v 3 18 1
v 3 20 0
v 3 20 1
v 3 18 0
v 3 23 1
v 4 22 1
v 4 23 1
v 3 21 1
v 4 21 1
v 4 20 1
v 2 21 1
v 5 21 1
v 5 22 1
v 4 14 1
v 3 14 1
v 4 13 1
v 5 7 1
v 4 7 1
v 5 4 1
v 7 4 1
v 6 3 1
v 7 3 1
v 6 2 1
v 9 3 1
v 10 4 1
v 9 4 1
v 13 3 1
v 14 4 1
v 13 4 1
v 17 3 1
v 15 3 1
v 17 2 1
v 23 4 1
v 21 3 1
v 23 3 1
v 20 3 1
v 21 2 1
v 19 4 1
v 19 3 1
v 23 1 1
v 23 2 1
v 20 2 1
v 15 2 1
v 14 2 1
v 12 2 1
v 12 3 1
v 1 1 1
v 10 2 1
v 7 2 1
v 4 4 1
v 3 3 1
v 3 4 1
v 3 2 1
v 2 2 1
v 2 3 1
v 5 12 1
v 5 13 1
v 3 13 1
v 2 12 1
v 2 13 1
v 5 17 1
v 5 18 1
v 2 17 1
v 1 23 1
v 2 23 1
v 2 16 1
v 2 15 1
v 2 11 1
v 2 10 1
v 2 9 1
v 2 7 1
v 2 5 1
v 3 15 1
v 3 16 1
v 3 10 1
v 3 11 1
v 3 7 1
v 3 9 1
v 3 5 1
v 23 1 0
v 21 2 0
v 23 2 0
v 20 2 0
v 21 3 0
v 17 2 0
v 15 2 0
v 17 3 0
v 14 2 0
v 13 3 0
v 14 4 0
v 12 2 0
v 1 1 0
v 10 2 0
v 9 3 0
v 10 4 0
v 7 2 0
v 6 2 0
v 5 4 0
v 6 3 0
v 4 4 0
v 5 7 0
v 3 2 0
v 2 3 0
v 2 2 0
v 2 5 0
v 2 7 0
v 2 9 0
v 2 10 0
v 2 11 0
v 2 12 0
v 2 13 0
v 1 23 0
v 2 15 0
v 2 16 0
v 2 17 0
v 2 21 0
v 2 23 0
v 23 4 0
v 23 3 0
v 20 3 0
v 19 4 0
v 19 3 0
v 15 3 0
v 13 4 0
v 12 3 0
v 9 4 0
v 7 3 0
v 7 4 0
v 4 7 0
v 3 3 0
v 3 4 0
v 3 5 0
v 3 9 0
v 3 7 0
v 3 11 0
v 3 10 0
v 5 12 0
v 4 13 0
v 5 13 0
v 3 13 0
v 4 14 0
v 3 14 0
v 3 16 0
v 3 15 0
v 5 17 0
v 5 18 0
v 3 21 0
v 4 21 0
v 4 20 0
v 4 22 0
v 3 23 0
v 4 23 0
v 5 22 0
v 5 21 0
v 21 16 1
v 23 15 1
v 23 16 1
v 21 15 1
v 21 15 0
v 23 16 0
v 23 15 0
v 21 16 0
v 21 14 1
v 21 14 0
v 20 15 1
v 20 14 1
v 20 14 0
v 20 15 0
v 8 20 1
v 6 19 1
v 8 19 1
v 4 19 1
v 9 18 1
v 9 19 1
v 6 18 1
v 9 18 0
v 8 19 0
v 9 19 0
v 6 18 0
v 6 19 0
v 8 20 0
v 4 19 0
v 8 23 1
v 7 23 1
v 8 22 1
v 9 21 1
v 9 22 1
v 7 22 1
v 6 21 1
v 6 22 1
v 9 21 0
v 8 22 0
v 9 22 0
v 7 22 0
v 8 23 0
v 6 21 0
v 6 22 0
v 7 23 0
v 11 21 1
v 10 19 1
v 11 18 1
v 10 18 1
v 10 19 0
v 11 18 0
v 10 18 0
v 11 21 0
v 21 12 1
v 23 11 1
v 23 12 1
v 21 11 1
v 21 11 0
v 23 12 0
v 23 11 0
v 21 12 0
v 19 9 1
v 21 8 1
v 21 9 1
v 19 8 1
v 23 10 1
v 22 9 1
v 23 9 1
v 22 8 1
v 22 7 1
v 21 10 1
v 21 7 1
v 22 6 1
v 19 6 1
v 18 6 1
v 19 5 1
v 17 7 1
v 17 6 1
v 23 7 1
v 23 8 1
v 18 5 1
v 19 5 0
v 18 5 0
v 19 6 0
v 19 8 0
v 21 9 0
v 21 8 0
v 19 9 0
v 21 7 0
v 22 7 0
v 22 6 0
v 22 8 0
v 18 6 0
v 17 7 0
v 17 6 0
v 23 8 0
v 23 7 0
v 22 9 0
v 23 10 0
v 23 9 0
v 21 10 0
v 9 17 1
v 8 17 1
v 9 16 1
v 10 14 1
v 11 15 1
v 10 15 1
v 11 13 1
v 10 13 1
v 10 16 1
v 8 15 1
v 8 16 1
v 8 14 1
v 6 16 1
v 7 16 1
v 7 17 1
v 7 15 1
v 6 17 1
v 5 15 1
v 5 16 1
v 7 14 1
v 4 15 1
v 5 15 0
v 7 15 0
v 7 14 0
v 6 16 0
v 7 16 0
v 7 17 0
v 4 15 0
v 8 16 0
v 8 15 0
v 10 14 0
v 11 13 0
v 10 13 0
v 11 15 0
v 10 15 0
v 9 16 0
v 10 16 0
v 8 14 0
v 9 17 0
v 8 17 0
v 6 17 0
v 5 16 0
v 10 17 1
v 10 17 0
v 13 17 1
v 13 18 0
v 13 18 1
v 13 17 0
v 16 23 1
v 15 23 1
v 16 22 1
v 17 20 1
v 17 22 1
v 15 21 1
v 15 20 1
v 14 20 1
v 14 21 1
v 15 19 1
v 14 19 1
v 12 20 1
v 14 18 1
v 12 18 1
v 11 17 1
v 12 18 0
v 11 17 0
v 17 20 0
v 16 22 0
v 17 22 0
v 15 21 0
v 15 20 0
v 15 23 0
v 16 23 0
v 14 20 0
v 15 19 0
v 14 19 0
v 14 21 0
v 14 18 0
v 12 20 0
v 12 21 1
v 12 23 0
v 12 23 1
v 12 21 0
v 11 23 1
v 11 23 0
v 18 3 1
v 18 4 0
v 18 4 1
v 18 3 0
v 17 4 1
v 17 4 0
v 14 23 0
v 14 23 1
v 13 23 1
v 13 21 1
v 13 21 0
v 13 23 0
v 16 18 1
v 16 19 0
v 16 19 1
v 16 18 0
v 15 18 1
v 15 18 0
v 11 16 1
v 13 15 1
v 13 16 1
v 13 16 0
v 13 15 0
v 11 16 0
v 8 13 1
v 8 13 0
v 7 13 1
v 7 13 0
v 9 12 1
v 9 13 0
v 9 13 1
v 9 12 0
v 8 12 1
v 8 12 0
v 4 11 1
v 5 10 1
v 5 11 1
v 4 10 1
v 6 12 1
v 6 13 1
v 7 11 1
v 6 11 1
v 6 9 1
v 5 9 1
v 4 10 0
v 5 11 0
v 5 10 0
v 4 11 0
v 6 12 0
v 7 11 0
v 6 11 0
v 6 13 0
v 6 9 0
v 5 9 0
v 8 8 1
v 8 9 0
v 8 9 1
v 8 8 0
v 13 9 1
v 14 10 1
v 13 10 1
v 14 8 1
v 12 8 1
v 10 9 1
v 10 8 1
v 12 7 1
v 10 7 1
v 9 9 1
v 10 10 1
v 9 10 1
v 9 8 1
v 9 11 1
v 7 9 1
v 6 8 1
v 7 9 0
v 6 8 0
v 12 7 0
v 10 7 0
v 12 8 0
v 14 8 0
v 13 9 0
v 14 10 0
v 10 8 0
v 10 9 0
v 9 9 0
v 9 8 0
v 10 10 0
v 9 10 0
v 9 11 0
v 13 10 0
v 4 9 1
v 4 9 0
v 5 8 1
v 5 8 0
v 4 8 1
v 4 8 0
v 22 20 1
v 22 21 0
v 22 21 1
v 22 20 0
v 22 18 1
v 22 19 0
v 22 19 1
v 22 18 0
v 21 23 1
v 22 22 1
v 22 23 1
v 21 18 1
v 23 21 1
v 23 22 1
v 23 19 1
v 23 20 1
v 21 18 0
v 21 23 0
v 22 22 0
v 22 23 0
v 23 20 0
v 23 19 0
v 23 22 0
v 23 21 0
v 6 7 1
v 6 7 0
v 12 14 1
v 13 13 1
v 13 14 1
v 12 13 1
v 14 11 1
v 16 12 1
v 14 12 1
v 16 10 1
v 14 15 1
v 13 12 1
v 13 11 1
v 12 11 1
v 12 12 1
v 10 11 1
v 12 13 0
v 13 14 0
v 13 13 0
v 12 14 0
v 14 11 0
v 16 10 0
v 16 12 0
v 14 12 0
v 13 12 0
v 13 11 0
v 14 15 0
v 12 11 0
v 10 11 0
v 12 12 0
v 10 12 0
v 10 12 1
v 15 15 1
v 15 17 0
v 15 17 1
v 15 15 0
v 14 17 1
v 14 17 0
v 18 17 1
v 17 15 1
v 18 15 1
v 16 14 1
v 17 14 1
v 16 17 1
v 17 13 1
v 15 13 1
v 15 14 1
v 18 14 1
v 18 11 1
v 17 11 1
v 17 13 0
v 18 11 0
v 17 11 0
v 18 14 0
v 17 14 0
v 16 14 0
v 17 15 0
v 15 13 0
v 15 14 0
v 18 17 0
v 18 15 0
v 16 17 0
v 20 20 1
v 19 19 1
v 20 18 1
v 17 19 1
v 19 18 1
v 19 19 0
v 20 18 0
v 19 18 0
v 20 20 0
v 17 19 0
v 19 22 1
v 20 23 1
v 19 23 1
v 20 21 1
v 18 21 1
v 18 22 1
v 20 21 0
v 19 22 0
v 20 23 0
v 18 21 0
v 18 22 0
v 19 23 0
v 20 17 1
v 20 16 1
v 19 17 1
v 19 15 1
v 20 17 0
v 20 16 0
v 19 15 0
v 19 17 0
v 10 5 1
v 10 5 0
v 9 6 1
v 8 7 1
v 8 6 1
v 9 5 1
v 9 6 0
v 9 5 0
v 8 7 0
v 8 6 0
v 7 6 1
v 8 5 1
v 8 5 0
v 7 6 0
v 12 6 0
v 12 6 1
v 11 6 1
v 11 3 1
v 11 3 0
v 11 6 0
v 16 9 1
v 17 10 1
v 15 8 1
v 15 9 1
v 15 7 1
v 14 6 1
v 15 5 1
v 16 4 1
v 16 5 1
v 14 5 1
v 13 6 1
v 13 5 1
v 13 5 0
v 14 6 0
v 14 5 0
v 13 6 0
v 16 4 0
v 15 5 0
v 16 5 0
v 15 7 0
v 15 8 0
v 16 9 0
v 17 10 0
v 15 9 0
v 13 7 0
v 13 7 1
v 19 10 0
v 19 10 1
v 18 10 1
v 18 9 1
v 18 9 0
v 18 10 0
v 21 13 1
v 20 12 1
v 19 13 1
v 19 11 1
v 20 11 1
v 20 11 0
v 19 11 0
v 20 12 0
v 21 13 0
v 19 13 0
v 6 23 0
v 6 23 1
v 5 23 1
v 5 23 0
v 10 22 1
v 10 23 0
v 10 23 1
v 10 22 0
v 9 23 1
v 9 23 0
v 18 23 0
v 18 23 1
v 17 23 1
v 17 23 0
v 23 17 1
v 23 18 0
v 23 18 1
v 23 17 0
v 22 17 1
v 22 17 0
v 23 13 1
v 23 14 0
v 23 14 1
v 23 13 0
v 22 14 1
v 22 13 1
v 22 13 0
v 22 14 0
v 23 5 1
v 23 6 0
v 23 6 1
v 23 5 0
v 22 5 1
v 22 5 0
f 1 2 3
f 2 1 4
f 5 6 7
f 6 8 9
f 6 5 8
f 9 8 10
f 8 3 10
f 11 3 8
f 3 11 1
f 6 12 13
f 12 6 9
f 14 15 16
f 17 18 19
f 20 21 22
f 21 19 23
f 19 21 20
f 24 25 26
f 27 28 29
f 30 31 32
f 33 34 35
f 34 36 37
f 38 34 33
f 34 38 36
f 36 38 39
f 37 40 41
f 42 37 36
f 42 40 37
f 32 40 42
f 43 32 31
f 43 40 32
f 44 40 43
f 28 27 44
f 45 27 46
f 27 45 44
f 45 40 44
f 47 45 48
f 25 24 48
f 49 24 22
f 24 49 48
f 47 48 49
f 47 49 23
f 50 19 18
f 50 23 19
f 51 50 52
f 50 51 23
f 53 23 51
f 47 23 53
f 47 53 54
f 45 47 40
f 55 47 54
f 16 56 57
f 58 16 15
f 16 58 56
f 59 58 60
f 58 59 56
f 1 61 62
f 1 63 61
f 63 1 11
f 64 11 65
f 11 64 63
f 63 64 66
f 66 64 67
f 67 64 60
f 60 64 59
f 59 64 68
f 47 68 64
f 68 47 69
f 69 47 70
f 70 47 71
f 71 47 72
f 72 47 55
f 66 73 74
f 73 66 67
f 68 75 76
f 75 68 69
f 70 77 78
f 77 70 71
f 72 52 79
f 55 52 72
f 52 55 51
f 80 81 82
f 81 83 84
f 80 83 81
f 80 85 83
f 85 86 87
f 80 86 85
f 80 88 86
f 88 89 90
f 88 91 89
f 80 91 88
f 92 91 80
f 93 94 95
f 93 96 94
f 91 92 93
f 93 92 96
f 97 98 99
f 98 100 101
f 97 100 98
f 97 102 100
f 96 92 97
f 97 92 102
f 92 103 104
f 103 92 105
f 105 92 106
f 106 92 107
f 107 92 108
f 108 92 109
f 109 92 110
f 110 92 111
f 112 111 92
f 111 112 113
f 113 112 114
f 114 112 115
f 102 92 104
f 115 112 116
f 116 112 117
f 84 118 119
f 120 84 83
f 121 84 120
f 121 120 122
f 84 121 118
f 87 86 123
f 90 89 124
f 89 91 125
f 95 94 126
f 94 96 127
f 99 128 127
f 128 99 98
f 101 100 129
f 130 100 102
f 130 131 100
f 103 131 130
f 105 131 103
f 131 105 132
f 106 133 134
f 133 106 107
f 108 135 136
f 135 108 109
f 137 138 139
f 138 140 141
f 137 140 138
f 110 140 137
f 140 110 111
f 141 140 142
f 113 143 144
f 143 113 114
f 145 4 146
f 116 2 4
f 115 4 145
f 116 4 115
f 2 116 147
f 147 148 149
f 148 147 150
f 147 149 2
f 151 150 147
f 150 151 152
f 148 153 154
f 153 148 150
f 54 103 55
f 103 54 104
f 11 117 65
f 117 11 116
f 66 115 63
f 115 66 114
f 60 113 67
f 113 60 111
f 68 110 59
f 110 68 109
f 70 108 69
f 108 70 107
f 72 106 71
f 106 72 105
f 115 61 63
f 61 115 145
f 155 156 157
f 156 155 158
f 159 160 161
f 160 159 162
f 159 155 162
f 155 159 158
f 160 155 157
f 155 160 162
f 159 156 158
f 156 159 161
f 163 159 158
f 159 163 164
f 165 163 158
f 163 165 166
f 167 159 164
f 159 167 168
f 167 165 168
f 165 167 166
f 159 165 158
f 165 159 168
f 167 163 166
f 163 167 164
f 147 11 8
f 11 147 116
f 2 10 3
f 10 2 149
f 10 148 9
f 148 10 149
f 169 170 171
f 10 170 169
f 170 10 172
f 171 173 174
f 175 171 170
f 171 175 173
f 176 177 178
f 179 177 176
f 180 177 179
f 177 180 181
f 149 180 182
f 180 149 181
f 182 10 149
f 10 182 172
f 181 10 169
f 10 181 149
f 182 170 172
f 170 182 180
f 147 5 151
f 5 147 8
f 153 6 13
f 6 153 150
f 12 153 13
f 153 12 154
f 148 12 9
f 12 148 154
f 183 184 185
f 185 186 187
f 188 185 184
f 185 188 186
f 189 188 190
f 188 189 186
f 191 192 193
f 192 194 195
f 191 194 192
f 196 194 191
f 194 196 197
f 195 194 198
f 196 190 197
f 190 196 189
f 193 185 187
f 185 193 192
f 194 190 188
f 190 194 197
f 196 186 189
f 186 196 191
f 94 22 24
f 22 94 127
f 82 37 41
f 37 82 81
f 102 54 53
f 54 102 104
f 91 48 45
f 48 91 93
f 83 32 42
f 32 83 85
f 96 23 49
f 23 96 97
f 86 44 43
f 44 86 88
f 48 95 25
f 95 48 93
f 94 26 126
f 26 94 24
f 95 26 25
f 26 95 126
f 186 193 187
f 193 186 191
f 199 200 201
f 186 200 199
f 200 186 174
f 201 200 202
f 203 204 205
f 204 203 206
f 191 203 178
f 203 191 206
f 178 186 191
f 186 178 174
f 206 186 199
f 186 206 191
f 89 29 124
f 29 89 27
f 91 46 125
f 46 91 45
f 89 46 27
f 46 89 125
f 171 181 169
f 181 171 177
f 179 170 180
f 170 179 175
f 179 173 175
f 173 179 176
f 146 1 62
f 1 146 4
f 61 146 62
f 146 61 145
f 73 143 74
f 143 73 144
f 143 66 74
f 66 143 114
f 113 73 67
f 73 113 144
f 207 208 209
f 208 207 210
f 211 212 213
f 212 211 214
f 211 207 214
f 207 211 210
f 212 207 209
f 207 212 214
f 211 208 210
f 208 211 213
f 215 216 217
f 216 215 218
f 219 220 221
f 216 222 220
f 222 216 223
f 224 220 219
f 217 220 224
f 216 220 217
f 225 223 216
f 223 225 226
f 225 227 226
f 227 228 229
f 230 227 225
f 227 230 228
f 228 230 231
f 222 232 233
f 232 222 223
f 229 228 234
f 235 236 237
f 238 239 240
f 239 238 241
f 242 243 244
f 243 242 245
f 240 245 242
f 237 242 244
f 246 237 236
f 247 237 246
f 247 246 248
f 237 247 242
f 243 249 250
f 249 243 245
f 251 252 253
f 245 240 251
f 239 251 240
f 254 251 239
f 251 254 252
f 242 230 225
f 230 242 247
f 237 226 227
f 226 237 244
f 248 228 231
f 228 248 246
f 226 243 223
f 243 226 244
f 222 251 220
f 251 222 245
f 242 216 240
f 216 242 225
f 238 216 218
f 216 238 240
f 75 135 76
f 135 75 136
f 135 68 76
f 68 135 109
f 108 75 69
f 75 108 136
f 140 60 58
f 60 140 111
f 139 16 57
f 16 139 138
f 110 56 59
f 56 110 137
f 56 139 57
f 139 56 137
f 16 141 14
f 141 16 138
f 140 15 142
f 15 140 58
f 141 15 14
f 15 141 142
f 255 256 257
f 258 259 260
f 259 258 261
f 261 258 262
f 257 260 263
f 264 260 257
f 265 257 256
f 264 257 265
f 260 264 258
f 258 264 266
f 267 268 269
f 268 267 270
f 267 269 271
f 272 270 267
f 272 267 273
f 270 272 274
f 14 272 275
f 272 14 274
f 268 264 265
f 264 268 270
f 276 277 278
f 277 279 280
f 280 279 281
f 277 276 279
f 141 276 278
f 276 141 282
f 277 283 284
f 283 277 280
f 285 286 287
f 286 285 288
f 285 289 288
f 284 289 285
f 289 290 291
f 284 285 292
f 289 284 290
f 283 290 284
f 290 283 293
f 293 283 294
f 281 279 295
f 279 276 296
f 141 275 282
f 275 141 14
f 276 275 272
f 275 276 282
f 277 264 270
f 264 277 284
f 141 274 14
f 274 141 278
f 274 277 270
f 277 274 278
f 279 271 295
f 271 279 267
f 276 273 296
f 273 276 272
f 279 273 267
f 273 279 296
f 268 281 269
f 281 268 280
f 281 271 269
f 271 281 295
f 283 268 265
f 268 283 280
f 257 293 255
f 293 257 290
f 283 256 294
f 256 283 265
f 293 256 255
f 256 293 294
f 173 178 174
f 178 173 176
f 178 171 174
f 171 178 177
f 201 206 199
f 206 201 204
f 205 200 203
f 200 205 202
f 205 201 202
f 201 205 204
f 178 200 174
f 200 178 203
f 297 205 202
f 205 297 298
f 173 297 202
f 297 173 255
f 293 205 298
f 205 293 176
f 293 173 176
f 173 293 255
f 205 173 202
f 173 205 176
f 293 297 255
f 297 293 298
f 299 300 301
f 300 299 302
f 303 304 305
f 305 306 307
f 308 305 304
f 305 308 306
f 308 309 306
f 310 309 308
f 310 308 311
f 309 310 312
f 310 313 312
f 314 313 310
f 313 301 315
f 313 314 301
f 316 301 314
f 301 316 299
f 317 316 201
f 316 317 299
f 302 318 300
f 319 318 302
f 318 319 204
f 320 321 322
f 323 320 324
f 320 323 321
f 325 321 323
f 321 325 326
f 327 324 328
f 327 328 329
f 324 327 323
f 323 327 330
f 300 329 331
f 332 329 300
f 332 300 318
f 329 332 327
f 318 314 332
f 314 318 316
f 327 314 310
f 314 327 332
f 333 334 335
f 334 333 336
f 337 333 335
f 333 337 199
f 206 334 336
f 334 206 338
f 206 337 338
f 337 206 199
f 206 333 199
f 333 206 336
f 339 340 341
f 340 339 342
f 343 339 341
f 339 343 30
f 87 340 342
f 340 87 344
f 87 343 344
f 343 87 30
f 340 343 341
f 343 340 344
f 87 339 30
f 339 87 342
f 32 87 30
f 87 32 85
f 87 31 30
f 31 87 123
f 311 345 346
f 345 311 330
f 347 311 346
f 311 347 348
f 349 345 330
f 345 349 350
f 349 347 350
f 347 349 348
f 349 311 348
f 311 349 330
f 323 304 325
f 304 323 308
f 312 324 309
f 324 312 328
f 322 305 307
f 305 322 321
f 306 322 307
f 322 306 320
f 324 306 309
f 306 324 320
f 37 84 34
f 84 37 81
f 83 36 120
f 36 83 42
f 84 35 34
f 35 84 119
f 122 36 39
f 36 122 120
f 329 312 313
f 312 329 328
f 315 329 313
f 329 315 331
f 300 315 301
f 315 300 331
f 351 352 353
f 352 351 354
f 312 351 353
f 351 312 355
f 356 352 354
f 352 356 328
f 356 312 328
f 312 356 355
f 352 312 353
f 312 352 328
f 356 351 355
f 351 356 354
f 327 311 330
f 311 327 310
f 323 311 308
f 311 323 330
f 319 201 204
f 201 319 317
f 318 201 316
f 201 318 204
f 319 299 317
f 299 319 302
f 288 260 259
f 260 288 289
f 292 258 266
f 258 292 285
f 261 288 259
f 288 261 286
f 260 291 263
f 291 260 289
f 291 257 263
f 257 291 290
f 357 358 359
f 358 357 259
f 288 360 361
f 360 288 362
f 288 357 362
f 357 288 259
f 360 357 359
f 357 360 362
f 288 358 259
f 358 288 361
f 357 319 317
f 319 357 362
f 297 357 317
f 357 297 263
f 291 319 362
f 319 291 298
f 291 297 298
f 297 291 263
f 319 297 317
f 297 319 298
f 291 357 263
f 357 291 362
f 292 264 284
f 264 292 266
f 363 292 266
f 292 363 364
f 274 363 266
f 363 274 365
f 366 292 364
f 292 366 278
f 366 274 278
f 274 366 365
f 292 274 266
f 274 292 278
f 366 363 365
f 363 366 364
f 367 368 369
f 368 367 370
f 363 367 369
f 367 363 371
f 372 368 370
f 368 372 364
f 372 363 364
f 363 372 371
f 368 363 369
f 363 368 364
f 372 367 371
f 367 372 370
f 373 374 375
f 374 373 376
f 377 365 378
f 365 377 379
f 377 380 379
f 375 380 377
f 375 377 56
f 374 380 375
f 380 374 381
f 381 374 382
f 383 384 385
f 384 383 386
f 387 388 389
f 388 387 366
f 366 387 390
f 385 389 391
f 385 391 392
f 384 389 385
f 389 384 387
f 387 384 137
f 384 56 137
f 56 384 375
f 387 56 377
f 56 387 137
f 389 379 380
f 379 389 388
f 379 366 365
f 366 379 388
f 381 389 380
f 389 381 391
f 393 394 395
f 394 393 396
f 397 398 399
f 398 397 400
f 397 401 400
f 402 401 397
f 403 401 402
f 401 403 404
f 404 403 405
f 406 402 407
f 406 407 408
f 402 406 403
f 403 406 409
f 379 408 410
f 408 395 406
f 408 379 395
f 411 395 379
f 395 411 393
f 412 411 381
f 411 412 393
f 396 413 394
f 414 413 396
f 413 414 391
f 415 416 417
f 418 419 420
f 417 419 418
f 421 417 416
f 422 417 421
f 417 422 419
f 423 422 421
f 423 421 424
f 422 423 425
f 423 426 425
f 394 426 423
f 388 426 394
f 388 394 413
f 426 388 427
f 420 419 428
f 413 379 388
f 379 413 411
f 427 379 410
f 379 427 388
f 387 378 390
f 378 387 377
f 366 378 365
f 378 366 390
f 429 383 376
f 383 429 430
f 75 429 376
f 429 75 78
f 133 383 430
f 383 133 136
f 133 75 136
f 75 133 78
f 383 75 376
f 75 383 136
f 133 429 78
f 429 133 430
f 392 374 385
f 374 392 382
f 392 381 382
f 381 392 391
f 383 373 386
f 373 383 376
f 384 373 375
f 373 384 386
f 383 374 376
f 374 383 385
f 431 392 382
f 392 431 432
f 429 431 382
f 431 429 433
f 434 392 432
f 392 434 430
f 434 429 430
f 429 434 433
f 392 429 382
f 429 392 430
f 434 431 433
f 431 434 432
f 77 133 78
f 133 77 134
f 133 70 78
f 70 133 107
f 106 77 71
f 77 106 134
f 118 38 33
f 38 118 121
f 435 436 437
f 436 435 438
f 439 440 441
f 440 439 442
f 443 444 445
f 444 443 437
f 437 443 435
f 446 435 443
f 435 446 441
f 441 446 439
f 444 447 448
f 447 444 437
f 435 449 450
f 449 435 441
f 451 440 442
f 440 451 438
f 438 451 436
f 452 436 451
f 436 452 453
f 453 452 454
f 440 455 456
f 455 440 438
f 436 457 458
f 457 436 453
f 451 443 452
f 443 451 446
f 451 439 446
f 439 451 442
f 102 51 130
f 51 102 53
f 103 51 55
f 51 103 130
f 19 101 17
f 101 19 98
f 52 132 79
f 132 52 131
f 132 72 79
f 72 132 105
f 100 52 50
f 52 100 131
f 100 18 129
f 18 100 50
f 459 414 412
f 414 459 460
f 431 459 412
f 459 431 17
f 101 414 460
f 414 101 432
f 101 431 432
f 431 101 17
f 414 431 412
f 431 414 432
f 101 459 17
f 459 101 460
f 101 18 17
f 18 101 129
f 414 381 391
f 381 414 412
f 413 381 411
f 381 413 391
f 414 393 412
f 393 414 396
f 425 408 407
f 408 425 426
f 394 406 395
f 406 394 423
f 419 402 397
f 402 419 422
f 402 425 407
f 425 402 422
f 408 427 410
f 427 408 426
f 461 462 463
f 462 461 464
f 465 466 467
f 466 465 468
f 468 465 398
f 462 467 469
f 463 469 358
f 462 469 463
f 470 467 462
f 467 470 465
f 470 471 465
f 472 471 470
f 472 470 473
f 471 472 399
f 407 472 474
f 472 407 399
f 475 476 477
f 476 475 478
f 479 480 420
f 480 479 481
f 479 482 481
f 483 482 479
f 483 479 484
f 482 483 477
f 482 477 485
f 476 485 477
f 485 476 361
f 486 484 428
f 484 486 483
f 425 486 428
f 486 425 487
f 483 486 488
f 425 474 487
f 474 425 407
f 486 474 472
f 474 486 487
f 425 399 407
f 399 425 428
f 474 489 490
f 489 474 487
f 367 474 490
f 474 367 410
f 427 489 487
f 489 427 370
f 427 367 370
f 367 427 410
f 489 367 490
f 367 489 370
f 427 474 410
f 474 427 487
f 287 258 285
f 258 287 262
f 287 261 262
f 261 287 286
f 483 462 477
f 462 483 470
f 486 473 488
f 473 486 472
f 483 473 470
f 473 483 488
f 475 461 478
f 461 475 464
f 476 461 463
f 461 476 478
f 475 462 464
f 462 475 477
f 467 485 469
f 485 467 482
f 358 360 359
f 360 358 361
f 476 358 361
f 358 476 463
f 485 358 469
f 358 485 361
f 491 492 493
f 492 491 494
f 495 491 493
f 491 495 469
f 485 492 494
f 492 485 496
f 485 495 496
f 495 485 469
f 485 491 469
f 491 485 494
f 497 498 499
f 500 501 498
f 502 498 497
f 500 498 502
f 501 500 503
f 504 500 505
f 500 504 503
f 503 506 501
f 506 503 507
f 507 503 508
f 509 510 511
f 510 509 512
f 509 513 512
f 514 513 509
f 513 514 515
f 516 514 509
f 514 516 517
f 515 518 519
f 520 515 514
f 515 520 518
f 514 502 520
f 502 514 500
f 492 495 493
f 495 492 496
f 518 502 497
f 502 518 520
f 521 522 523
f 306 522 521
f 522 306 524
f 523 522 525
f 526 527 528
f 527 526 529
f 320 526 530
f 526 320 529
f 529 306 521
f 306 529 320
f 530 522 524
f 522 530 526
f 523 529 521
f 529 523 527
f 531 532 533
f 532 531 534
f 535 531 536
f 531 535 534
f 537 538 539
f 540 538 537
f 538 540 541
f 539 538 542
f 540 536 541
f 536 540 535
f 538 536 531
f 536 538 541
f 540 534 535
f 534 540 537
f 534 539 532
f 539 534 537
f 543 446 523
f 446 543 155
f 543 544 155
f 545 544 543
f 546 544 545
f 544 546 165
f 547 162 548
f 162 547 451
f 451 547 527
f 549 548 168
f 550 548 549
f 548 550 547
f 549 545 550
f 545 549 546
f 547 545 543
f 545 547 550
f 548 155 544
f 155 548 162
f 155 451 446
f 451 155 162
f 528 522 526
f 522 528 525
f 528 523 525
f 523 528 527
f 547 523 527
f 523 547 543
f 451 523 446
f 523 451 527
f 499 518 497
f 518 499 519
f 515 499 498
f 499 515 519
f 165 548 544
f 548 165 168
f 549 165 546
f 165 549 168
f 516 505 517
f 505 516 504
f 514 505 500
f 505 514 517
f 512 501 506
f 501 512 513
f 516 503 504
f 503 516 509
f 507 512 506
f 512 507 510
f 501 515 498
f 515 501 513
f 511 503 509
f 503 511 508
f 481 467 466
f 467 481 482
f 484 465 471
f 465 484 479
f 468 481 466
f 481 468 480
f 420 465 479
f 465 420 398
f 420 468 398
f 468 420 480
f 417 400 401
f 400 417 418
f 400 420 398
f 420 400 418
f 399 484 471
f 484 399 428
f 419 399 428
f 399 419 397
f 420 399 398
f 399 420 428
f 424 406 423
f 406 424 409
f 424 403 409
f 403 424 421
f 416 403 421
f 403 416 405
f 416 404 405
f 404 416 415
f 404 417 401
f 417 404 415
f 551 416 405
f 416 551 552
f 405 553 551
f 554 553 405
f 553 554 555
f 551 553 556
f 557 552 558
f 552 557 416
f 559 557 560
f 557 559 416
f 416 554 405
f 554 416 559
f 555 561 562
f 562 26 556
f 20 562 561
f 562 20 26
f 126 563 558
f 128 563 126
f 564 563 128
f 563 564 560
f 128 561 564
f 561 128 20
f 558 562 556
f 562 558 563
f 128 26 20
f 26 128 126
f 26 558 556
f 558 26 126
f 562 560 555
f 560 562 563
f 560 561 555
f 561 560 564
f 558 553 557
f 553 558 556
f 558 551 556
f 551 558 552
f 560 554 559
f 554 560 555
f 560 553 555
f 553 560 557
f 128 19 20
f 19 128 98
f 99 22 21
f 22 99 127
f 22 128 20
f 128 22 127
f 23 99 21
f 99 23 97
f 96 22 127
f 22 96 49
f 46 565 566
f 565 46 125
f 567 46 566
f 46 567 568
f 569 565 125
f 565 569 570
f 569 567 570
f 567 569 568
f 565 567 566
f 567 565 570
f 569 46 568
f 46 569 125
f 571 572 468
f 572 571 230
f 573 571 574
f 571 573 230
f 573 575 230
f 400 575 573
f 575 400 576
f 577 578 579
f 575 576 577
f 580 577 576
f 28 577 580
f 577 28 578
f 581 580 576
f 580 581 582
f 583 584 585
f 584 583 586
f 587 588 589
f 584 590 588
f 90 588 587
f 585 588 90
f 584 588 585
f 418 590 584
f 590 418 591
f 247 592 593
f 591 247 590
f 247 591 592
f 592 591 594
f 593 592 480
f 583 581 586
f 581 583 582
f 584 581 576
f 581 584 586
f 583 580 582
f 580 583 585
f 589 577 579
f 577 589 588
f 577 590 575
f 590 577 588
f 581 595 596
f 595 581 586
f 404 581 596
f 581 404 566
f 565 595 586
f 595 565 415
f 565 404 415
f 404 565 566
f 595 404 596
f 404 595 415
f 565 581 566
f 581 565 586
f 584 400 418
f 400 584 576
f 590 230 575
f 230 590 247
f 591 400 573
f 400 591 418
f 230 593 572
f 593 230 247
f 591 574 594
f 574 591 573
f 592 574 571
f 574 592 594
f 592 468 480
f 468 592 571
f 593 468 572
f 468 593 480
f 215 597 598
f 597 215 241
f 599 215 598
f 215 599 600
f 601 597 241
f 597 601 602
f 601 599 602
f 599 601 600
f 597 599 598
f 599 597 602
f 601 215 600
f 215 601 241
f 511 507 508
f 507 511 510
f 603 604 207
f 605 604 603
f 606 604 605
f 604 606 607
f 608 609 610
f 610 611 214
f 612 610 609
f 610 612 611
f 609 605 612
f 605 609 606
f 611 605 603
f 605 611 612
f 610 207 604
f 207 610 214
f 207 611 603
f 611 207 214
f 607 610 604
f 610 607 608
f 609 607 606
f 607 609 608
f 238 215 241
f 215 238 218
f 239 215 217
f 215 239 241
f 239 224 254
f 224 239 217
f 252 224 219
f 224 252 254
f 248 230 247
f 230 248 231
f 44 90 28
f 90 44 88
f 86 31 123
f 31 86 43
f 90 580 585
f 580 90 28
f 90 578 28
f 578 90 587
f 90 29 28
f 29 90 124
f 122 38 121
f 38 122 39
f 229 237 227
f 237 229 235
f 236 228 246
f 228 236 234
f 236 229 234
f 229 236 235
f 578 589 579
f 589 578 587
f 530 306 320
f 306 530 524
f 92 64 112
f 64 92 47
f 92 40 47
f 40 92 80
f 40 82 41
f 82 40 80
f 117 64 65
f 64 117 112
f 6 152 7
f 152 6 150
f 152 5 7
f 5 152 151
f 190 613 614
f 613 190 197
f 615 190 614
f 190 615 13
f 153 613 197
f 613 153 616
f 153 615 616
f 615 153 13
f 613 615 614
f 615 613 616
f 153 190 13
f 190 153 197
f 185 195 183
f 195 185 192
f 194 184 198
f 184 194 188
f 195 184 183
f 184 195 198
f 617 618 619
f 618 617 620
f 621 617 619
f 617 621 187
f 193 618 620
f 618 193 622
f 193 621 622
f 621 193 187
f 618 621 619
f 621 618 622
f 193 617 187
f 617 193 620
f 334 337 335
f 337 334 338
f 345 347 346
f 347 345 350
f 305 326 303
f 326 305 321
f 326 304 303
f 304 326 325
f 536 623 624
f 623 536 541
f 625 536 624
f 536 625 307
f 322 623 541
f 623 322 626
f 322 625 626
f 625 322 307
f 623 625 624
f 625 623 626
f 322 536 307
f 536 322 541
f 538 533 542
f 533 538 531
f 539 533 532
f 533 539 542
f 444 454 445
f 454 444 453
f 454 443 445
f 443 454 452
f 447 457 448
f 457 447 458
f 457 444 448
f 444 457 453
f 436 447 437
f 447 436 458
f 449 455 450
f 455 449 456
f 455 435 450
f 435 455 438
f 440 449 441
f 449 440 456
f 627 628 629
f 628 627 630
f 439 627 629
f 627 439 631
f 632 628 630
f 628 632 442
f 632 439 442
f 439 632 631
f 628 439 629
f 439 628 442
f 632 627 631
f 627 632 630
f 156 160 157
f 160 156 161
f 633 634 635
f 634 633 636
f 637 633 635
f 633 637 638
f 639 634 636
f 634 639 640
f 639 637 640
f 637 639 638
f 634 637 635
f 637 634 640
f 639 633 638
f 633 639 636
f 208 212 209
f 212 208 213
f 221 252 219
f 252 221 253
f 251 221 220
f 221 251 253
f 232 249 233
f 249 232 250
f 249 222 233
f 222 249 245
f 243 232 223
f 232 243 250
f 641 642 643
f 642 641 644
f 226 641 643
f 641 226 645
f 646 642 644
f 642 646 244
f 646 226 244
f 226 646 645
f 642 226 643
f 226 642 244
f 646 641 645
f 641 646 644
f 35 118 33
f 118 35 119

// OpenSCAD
// file: ../../util/bitmap.scad
/*****************************************************************************
 * Module Bitmap Library
 * Modules to create bitmaps of unit squares from 1 or 2 dimensional vectors.
 *****************************************************************************
 * Copyright 2017 Chris Baker
 *
 * This program is free software: you can redistribute it and/or modify
 * it under the terms of the GNU Lesser General Public License as published by
 * the Free Software Foundation, either version 3 of the License, or
 * (at your option) any later version.
 *
 * This program is distributed in the hope that it will be useful,
 * but WITHOUT ANY WARRANTY; without even the implied warranty of
 * MERCHANTABILITY or FITNESS FOR A PARTICULAR PURPOSE.  See the
 * GNU Lesser General Public License for more details.
 *
 * You should have received a copy of the GNU Lesser General Public License
 * along with this program.  If not, see <http://www.gnu.org/licenses/>.
 *****************************************************************************
 * Usage:
 * Include this file with the "use" tag.
 * Depends on compat.scad library.
 *
 * API:
 *   1dbitmap(bitmap, center, expansion, vector_mode)
 *   2dbitmap(bitmap, center, expansion, vector_mode)
 *     Generate a 1 or 2-Dimensional field of modules based on the provided
 *     bitmap vector. See Bitmap Vectors below.
 *     The center flag determines whether to center the bitmap on the origin.
 *     The expansion value actually shrinks each cube in the x and y
 *     dimension by the specified amount.
 *     The vector_mode flag determines whether to create 3D solid geometry
 *     (unit cubes) or 2D vector geometry (squares).
 *
 * Bitmap Vectors:
 *   The bitmap vectors primarily provide boolean information.
 *   A module will be placed where these vectors have a postive value and
 *   skipped where they have a negative value. I.E. 0, -1, false, and undef
 *   are all equivalent and result in a skip. 1 and true are equivalent and
 *   result in a placed 1-unit module.
 *   Further, if the value is an integer it will be treated as a height for
 *   the module, allowing z-maps to be created.
 *   If the value is not an integer or boolean, it will be treated as a color
 *   reference. This can be a string or RGBA vector that will be used to
 *   color the module in the OpenSCAD preview window.
 *   In current versions of OpenSCAD, the color has no effect in the rendered
 *   view or STL output.
 *
 * Vector Mode:
 *   Although OpenSCAD supports generating 2D geometry, there are several
 *   caveats:
 *   - 2D and 3D geometry cannot be mixed
 *   - Extruding 2D geometry causes color information to be lost
 *   - All 2D geometry is projected onto the XY plane when rendering
 *   - Rendering also results in loss of color (same as 3D)
 *   - The SVG exporter is somewhat limited:
 *     - The pixel size of the image is hard-coded in the file
 *     - The title of the image is a generic string
 *     - The color selection for stroke and fill is fixed
 *     - The stroke-width is set to a large value that will cause overlap
 *     - The background is transparent
 *     - Only one path element is created with all of the geometry; there is
 *       no easy way to split up the geometry into multiple logical units.
 *     - These issues can mostly be resolved by hand-editing the file:
 *       - Remove or modify the width and height parameters from the svg
 *         element at the top of the file to provide better scaling.
 *       - Edit the title element at the top of the file to change the title.
 *       - Edit the stroke and fill parameters of the path element (these will
 *         probably be at the end of the file).
 *       - Set the stroke-width parameter for the path element to 0.
 *****************************************************************************/
use <compat.scad>

/*
 * 2dbitmap - Turn a 2D vector into a bitmap of cubes
 *
 * bitmap - 2D vector representing where to place each cube
 *          Value can either be boolean, z-height, or color
 * center - center cubes around the origin
 * expansion - size of gap around each pixel (screendoor)
 * vector_mode - create a 2D vector drawing instead of 3D extrusion
 */
module 2dbitmap(bitmap=[[1,0],[0,1]], center=false, expansion=0, vector_mode=false)
{
	ylen=len(bitmap)-1;

	for (y=[0:ylen]) {
		xlen=len(bitmap[y])-1;
		for (x=[0:xlen])
			translate([x-(center?xlen/2:0),ylen-y-(center?ylen/2:0),0])
				if (is_indexable(bitmap[y][x]))
					color(bitmap[y][x])
						if (vector_mode)
							square([1-expansion,1-expansion], center=center);
						else
							cube([1-expansion,1-expansion,1], center=center);
				else
					if (bitmap[y][x])
						if (vector_mode)
							square([1-expansion,1-expansion], center=center);
						else
							cube([1-expansion,1-expansion,clamp_nonnum(bitmap[y][x])], center=center);
	}
}

module 1dbitmap(bitmap=[1,0,1,0,1], center=false, expansion=0, vector_mode=false)
	2dbitmap([bitmap], center, expansion, vector_mode);

/*
 * Examples
 */

// 1D with z-height
translate([10,0,0]) scale([1,10,1])
	1dbitmap(bitmap=[1,1,0,2,0,0,3], expansion=.1);

// 1D with boolean
translate([-20,0,0]) scale([1,10,1])
	1dbitmap(bitmap=[true,false,true,false,true,true]);

// 2D with z-height
scale([2,2,1])
	2dbitmap(bitmap=[[1,0,2,1],[0,3,3,0],[1,1,0,1]],
		center=true);

// 1D with color
translate([0,-10,0]) scale([1,3,1])
	1dbitmap(bitmap=["red","white","blue",[0,0.3,0,0.5]]);

// 1D with color using 2D-vector-mode
translate([-7,-8,0]) scale([1,2])
	1dbitmap(bitmap=["red",0,"blue",0,"green"], vector_mode=true);
translate([-4.5,-10,0]) scale([1,2])
	1dbitmap(bitmap=["red",0,"blue",0,"green"], vector_mode=true, center=true);
// file: ../../util/bitlib.scad
/*****************************************************************************
 * Bit Manipulation Library
 * Provides some useful bit manipulation functions.
 *****************************************************************************
 * Copyright 2017 Chris Baker
 *
 * This program is free software: you can redistribute it and/or modify
 * it under the terms of the GNU Lesser General Public License as published by
 * the Free Software Foundation, either version 3 of the License, or
 * (at your option) any later version.
 *
 * This program is distributed in the hope that it will be useful,
 * but WITHOUT ANY WARRANTY; without even the implied warranty of
 * MERCHANTABILITY or FITNESS FOR A PARTICULAR PURPOSE.  See the
 * GNU Lesser General Public License for more details.
 *
 * You should have received a copy of the GNU Lesser General Public License
 * along with this program.  If not, see <http://www.gnu.org/licenses/>.
 *****************************************************************************
 * Usage:
 * Include this file with the "use" tag.
 * When run on its own, all echo statements in this
 * library should print "true".
 *
 * API:
 *   bit(v,b)
 *     Return the truth value of the b'th bit of v.
 *
 *   check_bit_size(v,b,signed=false)
 *     Determine whether the value v can be represented
 *     with b bits (b must be positive).
 *     The signed flag indicates whether to include the
 *     sign bit in the determination; otherwise negative
 *     values will result in undef being returned.
 *
 *   xor(a,b)
 *     Return the value of a xor b.
 *     Handles arbitrary size values for a and b.
 *     Handles negative values as expected (a positive
 *     result will be returned unless a and b have
 *     differing signs).
 *
 * TODO:
 *  - Change echos to asserts (future OpenSCAD version)
 *  - Add more functions
 *
 *****************************************************************************/

//Return the truth value of the b'th bit of v
function bit(v,b) =
	((v==undef)||(b==undef)||(b<0))?undef:
	(floor(v / pow(2, b)) % 2)?true:false;

echo("*** bit() testcases ***");
echo(0,bit(0,0)==false);
echo(1,bit(-1,0)==true);
echo(2,bit(1,0)==true);
echo(3,[for (i=[0:63]) bit(0,i)]==[for (i=[0:63]) false]); //0=0...0
echo(4,[for (i=[0:63]) bit(-1,i)]==[for (i=[0:63]) true]); //-1=1...1
echo(5,[for (i=[1:63]) bit(1,i)]==[for (i=[1:63]) false]); //1=0...01
echo(6,[for (i=[0:7]) bit(85,i)?1:0]==[1,0,1,0,1,0,1,0]); //85=01010101
echo(7,[for (i=[0:7]) bit(170,i)?1:0]==[0,1,0,1,0,1,0,1]); //170=10101010
echo(8,[for (i=[0:7]) bit(165,i)?1:0]==[1,0,1,0,0,1,0,1]); //165=10100101
echo(9,[for (i=[0:7]) bit(56,i)?1:0]==[0,0,0,1,1,1,0,0]); //56=00111000
echo(10,[for (i=[0:7]) bit(-3,i)?1:0]==[1,0,1,1,1,1,1,1]); //-3=1...101
//(2^64)=0...01 0...0
echo(11,bit(pow(2,64),64)==true);
echo(12,[for (i=[0:63]) bit(pow(2,64),i)]==[for (i=[0:63]) false]);
echo(13,[for (i=[65:127]) bit(pow(2,64),i)]==[for (i=[1:63]) false]);
//-(2^64)=1...1 0...0
echo(14,[for (i=[0:63]) bit(-pow(2,64),i)]==[for (i=[0:63]) false]);
echo(15,[for (i=[64:127]) bit(-pow(2,64),i)]==[for (i=[0:63]) true]);
echo(16,bit(10,-1)==undef);
echo(17,bit(10,undef)==undef);
echo(18,bit(undef,3)==undef);

//return true if v can be represented in b bits
//if signed flag is set. the result will be adjusted
//to account for the needed sign bit
function check_bit_size(v,b,signed=false) =
	(b<0)?undef:
	(v==undef)?undef:
	(b==0)?false:
	(v==0)?true: //(b>0)
	(signed)?
		(v<0)?(-pow(2,b-1)<(v+1)):
			(pow(2,b-1)>(v+1)):
		(v<0)?undef:
			(pow(2,b)>v);

echo("*** check_bit_size() testcases ***");
echo(0,check_bit_size(-1,2)==undef);
echo(1,check_bit_size(2,-4)==undef);
echo(2,check_bit_size(2,-4,signed=true)==undef);
echo(3,check_bit_size(0,0)==false);
echo(4,check_bit_size(0,1)==true);
echo(5,check_bit_size(1,0)==false);
echo(6,check_bit_size(1,1)==true);
echo(7,check_bit_size(7,3)==true);
echo(8,check_bit_size(8,3)==false);
echo(9,check_bit_size(1,3)==true);
echo(10,check_bit_size(256,8)==false);
echo(11,check_bit_size(255,8)==true);
echo(12,check_bit_size(10,2)==false);
echo(13,check_bit_size(10,4)==true);
echo(14,check_bit_size(-10,2,signed=true)==false);
echo(15,check_bit_size(-10,4,signed=true)==false);
echo(16,check_bit_size(-10,5,signed=true)==true);
echo(17,check_bit_size(-1,0,signed=true)==false);
echo(18,check_bit_size(-1,1,signed=true)==true);
echo(19,check_bit_size(0,0,signed=true)==false);
echo(20,check_bit_size(0,1,signed=true)==true);
echo(21,check_bit_size(-2,2,signed=true)==true);
echo(22,check_bit_size(-3,2,signed=true)==false);
echo(23,check_bit_size(-3,3,signed=true)==true);
echo(24,check_bit_size(-8,3,signed=true)==false);
echo(25,check_bit_size(-8,4,signed=true)==true);
echo(26,check_bit_size(undef,4)==undef);
echo(27,check_bit_size(undef,4,signed=true)==undef);

//return the value of a xor b
//runs recursively until all bits of a and b are exhausted
function xor(a,b,i=0) =
	((a==undef)||(b==undef))?undef:
	let (c=bit(a,i), d=bit(b,i),
		 v=((c||d) && !(c&&d))?pow(2,i):0)
		(check_bit_size(a,i,signed=true) &&
		 check_bit_size(b,i,signed=true))?
			-v: //special case for sign bit
			v+xor(a,b,i+1); //recursively add powers of 2

echo("*** xor() testcases ***");
echo(0,xor(42,0)==42);
echo(1,xor(42,42)==0);
echo(2,xor(169,238)==71); //10101001^11101110=01000111=71
echo(3,xor(238,169)==71);
echo(4,xor(42,238)==196); //00101010^11101110=11000100=196
echo(5,xor(169,42)==131); //10101001^00101010=10000011=131
echo(6,xor(-8,-10)==14); //11000^10110=01110=14
echo(7,xor(-7,-10)==15); //11001^10110=01111=15
echo(8,xor(9,-10)==-1); //01001^10110=11111=-1
echo(9,xor(9,-12)==-3); //01001^10100=11101=-3
echo(10,xor(undef,0)==undef);
// file: ../../util/stringlib.scad
/*****************************************************************************
 * String Manipulation Library
 * Provides some useful string manipulation functions.
 *****************************************************************************
 * Copyright 2017 Chris Baker
 *
 * This program is free software: you can redistribute it and/or modify
 * it under the terms of the GNU Lesser General Public License as published by
 * the Free Software Foundation, either version 3 of the License, or
 * (at your option) any later version.
 *
 * This program is distributed in the hope that it will be useful,
 * but WITHOUT ANY WARRANTY; without even the implied warranty of
 * MERCHANTABILITY or FITNESS FOR A PARTICULAR PURPOSE.  See the
 * GNU Lesser General Public License for more details.
 *
 * You should have received a copy of the GNU Lesser General Public License
 * along with this program.  If not, see <http://www.gnu.org/licenses/>.
 *****************************************************************************
 * Usage:
 * Include this file with the "use" tag.
 * When run on its own, all echo statements in this library should print
 * "true".
 *
 * API:
 *   atoi(a)
 *     Convert the string of numerals, a, to a vector of individual decimal
 *     numbers.
 *
 *   ascii_to_vec(a)
 *     Convert the ASCII string, a, into a vector of decimal numbers.
 *
 * TODO:
 *  - Change echos to asserts (future OpenSCAD version)
 *
 *****************************************************************************/

/*
 * atoi - convert ASCII numerals to a vector of individual decimal numbers
 *
 * a - the ASCII string of numerals
 */
function atoi(a) = (len(a)==undef)?undef:
[
	let (val = search(a, "0123456789"))
		for (i = val) i
];

echo("*** atoi() testcases ***");
echo(ascii_to_vec(undef)==undef);
echo(ascii_to_vec(true)==undef);
echo(ascii_to_vec(false)==undef);
echo(ascii_to_vec("")==[]);
echo(atoi("0")==[0]);
echo(atoi("1")==[1]);
echo(atoi("2")==[2]);
echo(atoi("3")==[3]);
echo(atoi("4")==[4]);
echo(atoi("5")==[5]);
echo(atoi("6")==[6]);
echo(atoi("7")==[7]);
echo(atoi("8")==[8]);
echo(atoi("9")==[9]);
echo(atoi("123")==[1,2,3]);
echo(atoi("1a23b")==[1,2,3]); //degenerate case, don't really care too much about the result

/*
 * ascii_to_vec - convert ASCII string to decimal vector
 *
 * a - the ASCII string to vectorize
 */
function ascii_to_vec(a) = (len(a)==undef)?undef:
[
	let (val = search(a, "\x01\x02\x03\x04\x05\x06\x07\x08\x09\x0a\x0b\x0c\x0d\x0e\x0f\x10\x11\x12\x13\x14\x15\x16\x17\x18\x19\x1a\x1b\x1c\x1d\x1e\x1f !\"#$%&'()*+,-./0123456789:;<=>?@ABCDEFGHIJKLMNOPQRSTUVWXYZ[\\]^_`abcdefghijklmnopqrstuvwxyz{|}~\x7f"))
		for (i = val) i+1
];

echo("*** ascii_to_vec() testcases ***");
echo(ascii_to_vec(undef)==undef);
echo(ascii_to_vec(true)==undef);
echo(ascii_to_vec(false)==undef);
echo(ascii_to_vec("")==[]);
echo(ascii_to_vec("0")==[48]);
echo(ascii_to_vec("a")==[97]);
echo(ascii_to_vec("0123456789")==[48,49,50,51,52,53,54,55,56,57]);
echo(ascii_to_vec("The quick brown fox jumped over the lazy dog.")
	==[84,104,101,32,113,117,105,99,107,32,98,114,111,119,110,32,102,111,120,32,106,117,109,112,101,100,32,111,118,101,114,32,116,104,101,32,108,97,122,121,32,100,111,103,46]);
// main file
/* Unit Test 08: 22x22 - 30 data bytes, 20 ecc bytes */
/* From http://www.idautomation.com */
use <../datamatrix.scad>
data_matrix(dm_ascii("http://www.idautomation.com"), mark="black");
